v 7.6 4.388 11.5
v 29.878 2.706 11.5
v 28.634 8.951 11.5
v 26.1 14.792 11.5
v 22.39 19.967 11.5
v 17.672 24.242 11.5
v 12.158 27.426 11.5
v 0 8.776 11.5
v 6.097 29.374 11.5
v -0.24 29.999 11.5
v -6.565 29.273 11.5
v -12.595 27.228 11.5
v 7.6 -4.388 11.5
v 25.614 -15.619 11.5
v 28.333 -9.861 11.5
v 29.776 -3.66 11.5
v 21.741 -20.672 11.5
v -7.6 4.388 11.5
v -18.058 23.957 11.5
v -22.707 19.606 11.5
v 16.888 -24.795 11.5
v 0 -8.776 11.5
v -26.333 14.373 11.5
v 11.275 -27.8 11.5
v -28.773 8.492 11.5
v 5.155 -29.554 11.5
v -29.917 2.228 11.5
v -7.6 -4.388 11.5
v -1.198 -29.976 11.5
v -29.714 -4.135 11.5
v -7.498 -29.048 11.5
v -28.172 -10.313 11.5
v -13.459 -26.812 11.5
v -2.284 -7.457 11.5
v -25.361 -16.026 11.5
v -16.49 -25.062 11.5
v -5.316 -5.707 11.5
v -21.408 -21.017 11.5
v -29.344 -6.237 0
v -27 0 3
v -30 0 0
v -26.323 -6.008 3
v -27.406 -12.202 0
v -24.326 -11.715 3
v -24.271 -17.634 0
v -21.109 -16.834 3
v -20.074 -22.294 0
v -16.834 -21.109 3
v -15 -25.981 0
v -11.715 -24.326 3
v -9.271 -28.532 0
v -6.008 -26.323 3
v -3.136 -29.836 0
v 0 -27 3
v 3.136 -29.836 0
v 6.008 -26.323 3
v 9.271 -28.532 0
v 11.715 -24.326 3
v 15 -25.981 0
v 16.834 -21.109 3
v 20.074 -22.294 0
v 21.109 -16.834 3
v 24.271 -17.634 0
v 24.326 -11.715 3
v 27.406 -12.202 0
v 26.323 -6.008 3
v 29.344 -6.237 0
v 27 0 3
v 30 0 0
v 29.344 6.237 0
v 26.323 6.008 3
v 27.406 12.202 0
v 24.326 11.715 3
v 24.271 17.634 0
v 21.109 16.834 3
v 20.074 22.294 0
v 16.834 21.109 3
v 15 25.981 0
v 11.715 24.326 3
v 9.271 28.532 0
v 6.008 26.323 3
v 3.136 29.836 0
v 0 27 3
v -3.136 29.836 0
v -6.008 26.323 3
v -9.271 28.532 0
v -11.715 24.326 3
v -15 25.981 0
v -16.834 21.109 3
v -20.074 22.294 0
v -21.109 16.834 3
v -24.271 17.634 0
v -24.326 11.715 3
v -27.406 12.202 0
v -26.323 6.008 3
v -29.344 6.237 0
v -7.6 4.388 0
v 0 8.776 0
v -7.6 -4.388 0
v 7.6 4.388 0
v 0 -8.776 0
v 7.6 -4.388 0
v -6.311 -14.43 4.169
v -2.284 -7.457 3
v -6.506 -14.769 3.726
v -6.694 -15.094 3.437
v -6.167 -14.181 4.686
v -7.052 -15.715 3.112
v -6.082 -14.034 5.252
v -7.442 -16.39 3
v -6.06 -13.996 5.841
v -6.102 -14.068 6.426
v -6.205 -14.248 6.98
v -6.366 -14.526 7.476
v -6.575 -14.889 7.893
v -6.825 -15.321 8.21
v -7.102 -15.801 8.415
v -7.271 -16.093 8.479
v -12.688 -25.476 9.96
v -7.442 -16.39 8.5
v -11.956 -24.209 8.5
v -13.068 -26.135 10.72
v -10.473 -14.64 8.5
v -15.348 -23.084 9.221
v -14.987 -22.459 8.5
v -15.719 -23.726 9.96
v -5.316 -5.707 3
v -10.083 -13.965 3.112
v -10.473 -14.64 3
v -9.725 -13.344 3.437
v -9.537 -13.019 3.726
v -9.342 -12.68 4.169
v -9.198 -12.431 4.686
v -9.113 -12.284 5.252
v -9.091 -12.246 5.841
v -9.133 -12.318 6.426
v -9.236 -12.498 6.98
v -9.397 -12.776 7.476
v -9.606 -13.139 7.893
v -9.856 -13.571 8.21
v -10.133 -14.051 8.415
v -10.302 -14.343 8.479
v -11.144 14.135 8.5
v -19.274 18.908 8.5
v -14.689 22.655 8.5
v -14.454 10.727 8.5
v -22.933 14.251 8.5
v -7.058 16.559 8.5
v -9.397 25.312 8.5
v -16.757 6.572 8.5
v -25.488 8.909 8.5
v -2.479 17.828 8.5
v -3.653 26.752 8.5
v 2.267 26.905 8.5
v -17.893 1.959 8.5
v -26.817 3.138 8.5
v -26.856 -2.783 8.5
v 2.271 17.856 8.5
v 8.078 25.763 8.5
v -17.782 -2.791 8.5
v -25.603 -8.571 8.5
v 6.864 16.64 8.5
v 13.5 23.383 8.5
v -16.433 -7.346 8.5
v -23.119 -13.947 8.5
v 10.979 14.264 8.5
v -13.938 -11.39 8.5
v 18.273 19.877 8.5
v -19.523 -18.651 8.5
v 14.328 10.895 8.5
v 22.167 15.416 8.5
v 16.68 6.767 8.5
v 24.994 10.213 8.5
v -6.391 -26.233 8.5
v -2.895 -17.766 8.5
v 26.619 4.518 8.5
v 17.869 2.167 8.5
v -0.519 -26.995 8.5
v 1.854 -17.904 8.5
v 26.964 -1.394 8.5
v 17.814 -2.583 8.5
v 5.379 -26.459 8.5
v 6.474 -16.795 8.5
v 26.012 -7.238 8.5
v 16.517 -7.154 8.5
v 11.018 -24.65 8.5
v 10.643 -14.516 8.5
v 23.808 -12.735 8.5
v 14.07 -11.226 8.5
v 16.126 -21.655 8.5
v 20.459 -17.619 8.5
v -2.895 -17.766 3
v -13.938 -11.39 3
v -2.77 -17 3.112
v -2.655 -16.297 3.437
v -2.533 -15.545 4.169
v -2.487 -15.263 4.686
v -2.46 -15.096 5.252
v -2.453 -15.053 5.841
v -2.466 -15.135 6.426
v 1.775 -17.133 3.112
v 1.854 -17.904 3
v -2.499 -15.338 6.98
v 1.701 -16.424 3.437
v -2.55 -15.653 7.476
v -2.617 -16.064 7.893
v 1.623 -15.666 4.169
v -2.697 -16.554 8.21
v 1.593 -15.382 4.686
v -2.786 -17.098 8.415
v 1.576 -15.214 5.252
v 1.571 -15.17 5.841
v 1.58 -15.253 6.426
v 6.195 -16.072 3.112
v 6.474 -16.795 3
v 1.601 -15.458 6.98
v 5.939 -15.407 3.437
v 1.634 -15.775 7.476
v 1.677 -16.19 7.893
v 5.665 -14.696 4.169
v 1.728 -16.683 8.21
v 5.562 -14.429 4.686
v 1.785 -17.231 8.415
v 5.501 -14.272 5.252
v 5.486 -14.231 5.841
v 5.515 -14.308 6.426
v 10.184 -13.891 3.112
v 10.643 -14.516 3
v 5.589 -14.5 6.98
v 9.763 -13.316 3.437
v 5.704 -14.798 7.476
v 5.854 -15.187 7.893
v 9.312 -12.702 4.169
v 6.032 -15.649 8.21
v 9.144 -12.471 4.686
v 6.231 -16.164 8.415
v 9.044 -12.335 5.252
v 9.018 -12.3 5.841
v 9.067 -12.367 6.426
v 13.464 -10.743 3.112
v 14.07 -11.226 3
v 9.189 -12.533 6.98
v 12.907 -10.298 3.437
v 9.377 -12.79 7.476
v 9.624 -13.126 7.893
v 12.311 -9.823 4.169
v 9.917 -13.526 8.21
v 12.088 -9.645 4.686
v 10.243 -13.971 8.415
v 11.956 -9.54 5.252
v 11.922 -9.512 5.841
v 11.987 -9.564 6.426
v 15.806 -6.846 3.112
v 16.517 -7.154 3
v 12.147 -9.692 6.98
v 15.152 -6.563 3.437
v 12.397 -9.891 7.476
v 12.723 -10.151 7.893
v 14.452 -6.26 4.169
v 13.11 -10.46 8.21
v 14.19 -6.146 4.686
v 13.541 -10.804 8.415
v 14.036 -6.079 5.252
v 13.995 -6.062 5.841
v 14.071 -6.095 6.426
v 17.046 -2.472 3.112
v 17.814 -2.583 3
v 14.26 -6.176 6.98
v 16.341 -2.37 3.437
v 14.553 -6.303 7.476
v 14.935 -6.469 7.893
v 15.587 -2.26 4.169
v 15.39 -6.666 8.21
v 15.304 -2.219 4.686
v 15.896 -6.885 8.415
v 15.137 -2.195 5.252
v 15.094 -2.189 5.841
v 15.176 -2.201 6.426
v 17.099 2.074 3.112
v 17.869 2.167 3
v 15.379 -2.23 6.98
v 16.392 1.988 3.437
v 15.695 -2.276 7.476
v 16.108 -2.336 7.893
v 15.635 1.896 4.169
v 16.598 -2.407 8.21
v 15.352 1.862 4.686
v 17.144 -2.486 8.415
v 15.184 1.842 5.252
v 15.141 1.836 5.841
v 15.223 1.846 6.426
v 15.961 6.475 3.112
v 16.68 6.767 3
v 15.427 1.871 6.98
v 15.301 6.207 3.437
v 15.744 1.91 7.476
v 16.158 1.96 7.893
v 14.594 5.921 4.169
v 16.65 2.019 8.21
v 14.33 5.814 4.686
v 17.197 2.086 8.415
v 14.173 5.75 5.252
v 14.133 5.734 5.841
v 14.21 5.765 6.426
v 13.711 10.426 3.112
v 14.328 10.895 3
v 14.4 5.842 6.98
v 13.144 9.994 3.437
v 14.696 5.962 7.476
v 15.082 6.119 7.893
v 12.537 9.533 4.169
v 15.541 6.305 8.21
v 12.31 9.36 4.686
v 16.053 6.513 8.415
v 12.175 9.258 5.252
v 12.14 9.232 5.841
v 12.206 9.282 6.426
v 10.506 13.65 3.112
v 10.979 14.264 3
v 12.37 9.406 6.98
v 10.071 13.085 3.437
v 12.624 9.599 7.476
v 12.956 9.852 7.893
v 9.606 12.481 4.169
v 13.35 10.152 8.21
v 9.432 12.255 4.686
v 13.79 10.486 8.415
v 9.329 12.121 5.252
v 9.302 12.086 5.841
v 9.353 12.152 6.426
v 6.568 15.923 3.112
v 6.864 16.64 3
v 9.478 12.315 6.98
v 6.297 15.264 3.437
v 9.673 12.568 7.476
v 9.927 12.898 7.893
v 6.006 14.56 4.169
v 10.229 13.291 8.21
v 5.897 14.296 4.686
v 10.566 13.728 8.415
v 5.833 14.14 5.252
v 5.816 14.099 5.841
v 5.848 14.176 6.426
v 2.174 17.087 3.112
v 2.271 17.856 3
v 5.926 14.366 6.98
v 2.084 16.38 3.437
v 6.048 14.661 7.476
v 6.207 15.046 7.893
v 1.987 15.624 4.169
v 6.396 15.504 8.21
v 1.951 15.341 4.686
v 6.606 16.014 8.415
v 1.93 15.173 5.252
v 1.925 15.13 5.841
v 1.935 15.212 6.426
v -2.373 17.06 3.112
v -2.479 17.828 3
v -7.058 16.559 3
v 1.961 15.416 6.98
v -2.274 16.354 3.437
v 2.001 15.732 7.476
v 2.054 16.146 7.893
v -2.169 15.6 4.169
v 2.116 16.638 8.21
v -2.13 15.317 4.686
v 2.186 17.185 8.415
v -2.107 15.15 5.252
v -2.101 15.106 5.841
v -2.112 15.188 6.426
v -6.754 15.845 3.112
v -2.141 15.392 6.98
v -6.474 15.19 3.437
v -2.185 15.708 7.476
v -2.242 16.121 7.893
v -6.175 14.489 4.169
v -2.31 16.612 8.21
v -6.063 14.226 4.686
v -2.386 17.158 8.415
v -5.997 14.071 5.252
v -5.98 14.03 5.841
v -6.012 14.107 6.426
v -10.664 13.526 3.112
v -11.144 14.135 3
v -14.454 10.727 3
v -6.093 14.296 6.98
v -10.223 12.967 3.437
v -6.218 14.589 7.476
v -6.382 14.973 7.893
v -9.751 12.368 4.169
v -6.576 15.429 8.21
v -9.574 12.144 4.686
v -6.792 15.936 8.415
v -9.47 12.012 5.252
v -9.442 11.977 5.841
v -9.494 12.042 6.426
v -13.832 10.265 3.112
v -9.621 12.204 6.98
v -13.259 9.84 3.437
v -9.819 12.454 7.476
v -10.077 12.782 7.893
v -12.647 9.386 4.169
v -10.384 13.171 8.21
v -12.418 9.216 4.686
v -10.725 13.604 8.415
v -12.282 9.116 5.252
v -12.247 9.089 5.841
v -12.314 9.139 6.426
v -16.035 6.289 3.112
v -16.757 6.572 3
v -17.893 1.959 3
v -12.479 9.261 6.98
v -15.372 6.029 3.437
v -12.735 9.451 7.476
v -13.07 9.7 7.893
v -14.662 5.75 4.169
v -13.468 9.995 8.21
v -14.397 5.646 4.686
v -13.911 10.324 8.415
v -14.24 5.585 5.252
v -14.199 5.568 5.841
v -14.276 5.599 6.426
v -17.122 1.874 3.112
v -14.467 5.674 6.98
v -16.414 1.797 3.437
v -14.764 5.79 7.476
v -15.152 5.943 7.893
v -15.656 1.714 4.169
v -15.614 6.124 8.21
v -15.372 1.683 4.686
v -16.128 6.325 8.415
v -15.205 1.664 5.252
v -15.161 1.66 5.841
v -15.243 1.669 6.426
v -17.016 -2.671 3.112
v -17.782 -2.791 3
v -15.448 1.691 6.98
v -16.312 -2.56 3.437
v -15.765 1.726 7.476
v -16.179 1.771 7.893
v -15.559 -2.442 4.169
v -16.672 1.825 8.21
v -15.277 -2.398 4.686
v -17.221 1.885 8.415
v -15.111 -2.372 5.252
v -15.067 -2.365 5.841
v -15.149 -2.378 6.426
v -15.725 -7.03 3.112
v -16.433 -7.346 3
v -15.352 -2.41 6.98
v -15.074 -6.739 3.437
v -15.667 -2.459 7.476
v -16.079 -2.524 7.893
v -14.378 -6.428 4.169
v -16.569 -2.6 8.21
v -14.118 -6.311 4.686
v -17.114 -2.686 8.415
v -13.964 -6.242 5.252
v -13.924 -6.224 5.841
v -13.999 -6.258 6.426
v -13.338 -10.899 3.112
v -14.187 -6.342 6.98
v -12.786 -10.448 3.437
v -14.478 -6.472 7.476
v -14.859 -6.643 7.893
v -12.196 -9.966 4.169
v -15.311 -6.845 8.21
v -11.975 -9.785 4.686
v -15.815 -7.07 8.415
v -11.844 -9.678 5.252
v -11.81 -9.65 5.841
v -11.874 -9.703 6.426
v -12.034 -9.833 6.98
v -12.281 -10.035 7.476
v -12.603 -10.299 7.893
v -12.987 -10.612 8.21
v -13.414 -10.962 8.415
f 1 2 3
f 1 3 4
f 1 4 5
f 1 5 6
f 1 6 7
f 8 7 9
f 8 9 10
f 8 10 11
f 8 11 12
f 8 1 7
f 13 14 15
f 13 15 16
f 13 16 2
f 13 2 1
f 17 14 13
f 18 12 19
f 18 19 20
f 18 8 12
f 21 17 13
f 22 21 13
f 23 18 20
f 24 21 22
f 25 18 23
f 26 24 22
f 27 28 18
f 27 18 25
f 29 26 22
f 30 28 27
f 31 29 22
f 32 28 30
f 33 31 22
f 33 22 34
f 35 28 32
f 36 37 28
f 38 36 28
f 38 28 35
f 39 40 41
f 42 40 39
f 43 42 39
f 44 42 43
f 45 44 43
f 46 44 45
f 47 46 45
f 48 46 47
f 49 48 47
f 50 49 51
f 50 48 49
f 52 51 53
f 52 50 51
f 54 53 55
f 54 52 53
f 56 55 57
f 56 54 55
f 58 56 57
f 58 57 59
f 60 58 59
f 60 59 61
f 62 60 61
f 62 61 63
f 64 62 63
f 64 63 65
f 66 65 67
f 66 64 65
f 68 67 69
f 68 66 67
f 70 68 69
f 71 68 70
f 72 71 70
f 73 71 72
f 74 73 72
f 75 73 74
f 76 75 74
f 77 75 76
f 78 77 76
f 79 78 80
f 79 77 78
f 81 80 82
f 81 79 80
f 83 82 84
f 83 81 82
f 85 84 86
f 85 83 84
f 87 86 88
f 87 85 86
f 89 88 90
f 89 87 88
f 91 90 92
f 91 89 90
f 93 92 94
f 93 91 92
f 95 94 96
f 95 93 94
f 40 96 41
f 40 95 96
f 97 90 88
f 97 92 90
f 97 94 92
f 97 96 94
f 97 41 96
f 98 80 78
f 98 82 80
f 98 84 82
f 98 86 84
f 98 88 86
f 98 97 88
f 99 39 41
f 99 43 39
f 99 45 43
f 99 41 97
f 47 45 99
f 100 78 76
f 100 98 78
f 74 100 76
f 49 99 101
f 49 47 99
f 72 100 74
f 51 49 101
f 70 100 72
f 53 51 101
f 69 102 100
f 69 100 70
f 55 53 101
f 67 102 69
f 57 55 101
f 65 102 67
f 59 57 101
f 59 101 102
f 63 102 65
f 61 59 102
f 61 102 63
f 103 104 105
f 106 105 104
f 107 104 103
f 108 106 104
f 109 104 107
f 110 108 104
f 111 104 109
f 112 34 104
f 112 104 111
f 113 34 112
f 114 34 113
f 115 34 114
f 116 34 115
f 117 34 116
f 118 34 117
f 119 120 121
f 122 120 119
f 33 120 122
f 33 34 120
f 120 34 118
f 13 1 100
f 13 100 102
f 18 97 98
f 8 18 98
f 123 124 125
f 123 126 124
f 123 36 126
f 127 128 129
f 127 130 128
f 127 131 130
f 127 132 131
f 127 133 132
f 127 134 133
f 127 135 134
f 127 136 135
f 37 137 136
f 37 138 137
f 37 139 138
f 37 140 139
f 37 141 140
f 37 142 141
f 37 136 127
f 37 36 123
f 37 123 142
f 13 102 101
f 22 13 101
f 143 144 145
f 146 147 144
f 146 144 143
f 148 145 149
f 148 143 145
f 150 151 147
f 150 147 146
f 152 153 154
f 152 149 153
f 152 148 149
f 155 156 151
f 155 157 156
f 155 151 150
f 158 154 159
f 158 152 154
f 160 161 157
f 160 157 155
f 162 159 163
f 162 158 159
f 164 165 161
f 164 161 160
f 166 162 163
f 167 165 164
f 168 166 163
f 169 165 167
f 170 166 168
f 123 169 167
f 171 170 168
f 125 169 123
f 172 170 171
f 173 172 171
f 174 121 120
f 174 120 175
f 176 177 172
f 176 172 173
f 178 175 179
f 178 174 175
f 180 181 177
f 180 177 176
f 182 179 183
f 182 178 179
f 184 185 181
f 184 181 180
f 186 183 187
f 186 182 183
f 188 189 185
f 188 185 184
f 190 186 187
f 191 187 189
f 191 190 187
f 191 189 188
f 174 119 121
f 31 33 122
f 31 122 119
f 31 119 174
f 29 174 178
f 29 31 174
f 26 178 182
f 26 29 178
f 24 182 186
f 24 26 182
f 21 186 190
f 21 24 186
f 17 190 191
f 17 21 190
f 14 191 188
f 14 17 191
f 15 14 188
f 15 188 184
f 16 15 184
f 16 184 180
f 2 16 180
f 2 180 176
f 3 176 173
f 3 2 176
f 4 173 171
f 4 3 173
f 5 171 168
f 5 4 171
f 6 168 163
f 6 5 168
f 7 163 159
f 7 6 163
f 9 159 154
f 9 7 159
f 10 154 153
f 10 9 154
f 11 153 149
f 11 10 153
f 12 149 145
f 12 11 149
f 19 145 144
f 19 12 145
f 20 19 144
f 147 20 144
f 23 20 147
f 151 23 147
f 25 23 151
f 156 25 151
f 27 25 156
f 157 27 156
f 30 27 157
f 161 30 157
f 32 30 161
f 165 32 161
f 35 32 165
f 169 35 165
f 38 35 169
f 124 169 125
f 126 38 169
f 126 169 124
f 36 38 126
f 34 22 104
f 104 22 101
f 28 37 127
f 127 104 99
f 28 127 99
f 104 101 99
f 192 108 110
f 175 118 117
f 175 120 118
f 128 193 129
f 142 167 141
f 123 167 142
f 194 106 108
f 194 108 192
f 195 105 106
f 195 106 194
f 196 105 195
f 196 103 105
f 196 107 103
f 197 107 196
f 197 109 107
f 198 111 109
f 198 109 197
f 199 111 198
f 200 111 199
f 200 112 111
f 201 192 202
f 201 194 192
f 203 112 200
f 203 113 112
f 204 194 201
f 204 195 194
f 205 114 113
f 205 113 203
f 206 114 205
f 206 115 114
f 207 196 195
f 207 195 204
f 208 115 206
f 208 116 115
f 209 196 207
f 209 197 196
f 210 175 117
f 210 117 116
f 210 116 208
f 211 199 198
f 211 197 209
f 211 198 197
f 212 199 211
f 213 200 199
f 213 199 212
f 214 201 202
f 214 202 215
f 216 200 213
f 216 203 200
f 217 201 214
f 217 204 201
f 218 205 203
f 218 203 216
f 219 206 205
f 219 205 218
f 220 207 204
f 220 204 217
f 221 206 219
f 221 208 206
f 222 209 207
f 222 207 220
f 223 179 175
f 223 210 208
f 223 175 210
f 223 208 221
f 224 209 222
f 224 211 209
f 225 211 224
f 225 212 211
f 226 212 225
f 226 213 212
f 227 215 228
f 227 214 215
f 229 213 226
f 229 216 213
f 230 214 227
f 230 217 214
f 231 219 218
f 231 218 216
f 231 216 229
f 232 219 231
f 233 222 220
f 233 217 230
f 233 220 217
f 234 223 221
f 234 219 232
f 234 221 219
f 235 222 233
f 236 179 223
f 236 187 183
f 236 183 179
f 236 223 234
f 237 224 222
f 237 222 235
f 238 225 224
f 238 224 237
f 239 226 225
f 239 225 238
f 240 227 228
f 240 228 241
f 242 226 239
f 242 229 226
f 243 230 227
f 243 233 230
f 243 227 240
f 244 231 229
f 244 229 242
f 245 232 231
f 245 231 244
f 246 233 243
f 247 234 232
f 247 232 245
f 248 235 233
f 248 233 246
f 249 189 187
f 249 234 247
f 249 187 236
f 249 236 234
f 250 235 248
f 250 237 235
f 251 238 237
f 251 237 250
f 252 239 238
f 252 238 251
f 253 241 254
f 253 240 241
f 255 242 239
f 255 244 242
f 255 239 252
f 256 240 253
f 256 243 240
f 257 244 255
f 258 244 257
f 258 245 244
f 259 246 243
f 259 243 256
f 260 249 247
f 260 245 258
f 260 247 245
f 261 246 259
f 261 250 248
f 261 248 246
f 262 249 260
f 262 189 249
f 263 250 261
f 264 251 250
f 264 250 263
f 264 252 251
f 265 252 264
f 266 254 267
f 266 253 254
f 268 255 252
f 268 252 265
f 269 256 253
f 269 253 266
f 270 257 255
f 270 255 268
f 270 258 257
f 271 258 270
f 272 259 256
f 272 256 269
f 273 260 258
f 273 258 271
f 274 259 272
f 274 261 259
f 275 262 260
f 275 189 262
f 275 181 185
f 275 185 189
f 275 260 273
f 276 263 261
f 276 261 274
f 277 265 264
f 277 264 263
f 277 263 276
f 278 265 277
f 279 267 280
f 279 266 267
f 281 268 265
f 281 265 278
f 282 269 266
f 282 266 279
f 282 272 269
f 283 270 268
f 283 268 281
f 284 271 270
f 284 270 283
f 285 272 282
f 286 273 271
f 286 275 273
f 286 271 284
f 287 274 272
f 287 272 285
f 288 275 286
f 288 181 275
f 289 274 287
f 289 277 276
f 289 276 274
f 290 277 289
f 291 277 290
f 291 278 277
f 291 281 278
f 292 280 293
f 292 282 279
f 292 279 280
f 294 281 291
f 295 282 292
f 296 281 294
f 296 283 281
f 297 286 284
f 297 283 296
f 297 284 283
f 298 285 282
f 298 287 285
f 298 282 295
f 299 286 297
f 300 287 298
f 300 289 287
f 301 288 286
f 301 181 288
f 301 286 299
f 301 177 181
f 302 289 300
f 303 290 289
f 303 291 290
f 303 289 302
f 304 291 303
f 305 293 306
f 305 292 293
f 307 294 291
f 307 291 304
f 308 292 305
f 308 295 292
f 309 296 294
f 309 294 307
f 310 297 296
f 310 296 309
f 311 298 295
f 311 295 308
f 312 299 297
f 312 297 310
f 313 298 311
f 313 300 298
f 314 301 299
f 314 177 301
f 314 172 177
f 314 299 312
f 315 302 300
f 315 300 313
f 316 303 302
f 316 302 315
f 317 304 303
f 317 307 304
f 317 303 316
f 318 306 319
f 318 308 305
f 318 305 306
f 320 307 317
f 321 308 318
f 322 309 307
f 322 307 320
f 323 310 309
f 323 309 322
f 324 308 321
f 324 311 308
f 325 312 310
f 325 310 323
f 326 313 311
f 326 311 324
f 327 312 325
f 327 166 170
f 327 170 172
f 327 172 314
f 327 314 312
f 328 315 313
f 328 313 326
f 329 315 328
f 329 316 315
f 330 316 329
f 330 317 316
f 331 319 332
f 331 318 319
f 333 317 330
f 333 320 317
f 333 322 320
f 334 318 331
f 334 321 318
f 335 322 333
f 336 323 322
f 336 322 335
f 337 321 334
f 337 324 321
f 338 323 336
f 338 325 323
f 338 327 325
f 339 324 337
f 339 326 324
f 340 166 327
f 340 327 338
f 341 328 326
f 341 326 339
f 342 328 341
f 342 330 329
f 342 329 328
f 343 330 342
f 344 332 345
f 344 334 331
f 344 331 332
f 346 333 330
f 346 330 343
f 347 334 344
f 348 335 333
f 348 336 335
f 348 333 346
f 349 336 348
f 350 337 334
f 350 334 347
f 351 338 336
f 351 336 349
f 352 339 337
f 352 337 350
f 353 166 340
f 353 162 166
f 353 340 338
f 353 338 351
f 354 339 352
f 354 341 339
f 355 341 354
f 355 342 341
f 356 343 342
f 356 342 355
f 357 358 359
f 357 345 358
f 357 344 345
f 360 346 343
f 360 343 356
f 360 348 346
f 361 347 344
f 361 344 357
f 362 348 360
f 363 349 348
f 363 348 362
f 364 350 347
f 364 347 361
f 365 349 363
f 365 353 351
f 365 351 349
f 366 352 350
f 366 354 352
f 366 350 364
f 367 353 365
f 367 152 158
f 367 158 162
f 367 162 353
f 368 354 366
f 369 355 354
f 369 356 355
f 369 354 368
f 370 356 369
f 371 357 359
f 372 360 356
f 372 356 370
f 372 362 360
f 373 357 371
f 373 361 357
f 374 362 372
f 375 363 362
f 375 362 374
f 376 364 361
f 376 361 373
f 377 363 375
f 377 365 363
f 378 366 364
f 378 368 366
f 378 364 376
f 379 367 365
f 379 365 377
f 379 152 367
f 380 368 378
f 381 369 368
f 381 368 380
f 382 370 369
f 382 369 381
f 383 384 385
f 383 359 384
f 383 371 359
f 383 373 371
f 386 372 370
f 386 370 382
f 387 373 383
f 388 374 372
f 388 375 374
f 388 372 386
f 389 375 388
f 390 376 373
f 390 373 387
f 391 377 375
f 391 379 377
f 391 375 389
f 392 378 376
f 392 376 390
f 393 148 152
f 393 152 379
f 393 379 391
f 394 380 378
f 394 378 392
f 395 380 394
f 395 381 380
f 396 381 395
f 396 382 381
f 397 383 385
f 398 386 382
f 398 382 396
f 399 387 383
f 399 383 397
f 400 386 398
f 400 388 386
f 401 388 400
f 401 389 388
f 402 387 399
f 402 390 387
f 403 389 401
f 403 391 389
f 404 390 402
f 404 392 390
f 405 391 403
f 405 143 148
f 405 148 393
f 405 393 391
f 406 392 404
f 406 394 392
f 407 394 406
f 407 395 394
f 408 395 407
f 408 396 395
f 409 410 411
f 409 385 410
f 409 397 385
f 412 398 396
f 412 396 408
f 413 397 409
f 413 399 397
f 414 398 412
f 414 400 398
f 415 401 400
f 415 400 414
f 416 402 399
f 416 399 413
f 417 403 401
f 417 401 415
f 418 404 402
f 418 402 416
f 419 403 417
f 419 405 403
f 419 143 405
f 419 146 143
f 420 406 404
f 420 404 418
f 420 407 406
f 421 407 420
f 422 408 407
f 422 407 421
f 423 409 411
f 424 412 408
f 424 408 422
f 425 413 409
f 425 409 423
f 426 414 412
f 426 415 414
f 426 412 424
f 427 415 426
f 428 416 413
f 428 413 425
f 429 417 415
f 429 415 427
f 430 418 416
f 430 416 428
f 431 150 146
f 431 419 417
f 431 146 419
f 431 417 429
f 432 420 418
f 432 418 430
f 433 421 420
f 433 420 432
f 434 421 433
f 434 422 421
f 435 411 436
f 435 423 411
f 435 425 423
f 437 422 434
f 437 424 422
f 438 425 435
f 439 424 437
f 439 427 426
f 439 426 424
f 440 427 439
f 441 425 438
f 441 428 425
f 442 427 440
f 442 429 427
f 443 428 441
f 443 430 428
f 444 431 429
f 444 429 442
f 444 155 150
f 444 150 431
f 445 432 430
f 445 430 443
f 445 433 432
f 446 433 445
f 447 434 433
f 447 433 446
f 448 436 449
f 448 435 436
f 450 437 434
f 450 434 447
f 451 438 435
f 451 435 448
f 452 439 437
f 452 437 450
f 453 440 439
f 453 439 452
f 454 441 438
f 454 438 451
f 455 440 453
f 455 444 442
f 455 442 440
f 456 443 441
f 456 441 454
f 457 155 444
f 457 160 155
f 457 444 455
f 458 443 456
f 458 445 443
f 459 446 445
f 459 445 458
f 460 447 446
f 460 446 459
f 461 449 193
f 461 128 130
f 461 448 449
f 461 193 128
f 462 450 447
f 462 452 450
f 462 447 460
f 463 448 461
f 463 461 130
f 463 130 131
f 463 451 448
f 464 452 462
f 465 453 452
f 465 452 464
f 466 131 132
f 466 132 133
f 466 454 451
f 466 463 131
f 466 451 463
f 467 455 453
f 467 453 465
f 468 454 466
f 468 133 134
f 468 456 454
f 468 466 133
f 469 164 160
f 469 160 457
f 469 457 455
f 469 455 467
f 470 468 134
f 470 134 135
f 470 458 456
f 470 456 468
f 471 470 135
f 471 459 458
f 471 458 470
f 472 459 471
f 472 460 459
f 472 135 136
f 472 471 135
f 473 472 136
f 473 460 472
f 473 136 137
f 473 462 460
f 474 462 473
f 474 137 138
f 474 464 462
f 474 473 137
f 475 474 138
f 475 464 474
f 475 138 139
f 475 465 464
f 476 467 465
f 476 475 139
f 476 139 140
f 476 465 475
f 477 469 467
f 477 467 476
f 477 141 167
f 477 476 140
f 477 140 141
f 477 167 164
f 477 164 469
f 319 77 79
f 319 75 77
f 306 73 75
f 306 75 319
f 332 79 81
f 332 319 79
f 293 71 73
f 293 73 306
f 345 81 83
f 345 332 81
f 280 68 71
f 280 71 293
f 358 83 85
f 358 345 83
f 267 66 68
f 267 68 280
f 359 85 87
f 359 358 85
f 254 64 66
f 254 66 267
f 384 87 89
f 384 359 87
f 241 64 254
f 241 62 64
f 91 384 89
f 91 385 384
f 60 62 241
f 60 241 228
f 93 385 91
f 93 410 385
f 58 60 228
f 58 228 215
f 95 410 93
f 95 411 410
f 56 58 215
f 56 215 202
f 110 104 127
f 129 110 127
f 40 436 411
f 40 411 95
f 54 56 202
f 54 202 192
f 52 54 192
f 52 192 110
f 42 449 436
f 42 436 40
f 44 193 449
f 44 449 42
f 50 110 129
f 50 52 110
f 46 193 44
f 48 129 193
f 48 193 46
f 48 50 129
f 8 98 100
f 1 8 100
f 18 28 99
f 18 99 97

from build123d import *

# Parameters (mm, degrees)
ENL_V_MAT_EXTRU_1_DEPTH = 44.957365708
ENL_V_MAT_EXTRU_2_REACH = 45.957


with BuildPart() as part:
    # Esquisse1 → Révolution1 (revolve)
    with BuildSketch(Plane(origin=(0, 0, 0), x_dir=(-1, 0, 0), z_dir=(0, 1, 0))):
        with BuildLine():
            Line((0, 11.5), (0, 0))
            Line((0, 0), (30, 0))
            Line((30, 0), (27, 3))
            Line((27, 3), (18, 3))
            ThreePointArc((18, 3), (15.25, 5.75), (18, 8.5))
            Line((18, 8.5), (27, 8.5))
            Line((27, 8.5), (30, 11.5))
            Line((30, 11.5), (0, 11.5))
        make_face()
    revolve(axis=Axis((0, 0, 0), (0, 0, 1)))

    # Esquisse2 → Enlèv. mat.-Extru.1 (cut, through all)
    with BuildSketch(Plane(origin=(0, 0, 0), x_dir=(1, 0, 0), z_dir=(0, 0, -1))):
        Polygon((7.6, 4.387862046), (0, 8.775724092), (-7.6, 4.387862046), (-7.6, -4.387862046), (0, -8.775724092), (7.6, -4.387862046), align=None)
    extrude(amount=-ENL_V_MAT_EXTRU_1_DEPTH, mode=Mode.SUBTRACT)

    # Enlèv. mat.-Extru.2: up to this face of the body (flat: up to its plane)
    enl_v_mat_extru_2_end = Plane(part.part.faces().sort_by_distance((26.236324676, 0, 3))[0])
    # Esquisse3 → Enlèv. mat.-Extru.2 (cut, up to the picked face)
    with BuildSketch(Plane.XY.offset(11.5), mode=Mode.PRIVATE) as enl_v_mat_extru_2_sk1:
        Polygon((-14.784455543, -29.107428163), (-17.815544457, -27.357428163), (-5.315544457, -5.706793069), (-2.284455543, -7.456793069), align=None)
    enl_v_mat_extru_2_tool1 = split(extrude(enl_v_mat_extru_2_sk1.sketch, amount=-ENL_V_MAT_EXTRU_2_REACH, mode=Mode.PRIVATE), bisect_by=enl_v_mat_extru_2_end, keep=Keep.BOTH, mode=Mode.PRIVATE)
    add(enl_v_mat_extru_2_tool1.solids().sort_by(Axis((-10.05, -17.407111, 11.5), (0, 0, -1)))[0], mode=Mode.SUBTRACT)


solid = part.part
